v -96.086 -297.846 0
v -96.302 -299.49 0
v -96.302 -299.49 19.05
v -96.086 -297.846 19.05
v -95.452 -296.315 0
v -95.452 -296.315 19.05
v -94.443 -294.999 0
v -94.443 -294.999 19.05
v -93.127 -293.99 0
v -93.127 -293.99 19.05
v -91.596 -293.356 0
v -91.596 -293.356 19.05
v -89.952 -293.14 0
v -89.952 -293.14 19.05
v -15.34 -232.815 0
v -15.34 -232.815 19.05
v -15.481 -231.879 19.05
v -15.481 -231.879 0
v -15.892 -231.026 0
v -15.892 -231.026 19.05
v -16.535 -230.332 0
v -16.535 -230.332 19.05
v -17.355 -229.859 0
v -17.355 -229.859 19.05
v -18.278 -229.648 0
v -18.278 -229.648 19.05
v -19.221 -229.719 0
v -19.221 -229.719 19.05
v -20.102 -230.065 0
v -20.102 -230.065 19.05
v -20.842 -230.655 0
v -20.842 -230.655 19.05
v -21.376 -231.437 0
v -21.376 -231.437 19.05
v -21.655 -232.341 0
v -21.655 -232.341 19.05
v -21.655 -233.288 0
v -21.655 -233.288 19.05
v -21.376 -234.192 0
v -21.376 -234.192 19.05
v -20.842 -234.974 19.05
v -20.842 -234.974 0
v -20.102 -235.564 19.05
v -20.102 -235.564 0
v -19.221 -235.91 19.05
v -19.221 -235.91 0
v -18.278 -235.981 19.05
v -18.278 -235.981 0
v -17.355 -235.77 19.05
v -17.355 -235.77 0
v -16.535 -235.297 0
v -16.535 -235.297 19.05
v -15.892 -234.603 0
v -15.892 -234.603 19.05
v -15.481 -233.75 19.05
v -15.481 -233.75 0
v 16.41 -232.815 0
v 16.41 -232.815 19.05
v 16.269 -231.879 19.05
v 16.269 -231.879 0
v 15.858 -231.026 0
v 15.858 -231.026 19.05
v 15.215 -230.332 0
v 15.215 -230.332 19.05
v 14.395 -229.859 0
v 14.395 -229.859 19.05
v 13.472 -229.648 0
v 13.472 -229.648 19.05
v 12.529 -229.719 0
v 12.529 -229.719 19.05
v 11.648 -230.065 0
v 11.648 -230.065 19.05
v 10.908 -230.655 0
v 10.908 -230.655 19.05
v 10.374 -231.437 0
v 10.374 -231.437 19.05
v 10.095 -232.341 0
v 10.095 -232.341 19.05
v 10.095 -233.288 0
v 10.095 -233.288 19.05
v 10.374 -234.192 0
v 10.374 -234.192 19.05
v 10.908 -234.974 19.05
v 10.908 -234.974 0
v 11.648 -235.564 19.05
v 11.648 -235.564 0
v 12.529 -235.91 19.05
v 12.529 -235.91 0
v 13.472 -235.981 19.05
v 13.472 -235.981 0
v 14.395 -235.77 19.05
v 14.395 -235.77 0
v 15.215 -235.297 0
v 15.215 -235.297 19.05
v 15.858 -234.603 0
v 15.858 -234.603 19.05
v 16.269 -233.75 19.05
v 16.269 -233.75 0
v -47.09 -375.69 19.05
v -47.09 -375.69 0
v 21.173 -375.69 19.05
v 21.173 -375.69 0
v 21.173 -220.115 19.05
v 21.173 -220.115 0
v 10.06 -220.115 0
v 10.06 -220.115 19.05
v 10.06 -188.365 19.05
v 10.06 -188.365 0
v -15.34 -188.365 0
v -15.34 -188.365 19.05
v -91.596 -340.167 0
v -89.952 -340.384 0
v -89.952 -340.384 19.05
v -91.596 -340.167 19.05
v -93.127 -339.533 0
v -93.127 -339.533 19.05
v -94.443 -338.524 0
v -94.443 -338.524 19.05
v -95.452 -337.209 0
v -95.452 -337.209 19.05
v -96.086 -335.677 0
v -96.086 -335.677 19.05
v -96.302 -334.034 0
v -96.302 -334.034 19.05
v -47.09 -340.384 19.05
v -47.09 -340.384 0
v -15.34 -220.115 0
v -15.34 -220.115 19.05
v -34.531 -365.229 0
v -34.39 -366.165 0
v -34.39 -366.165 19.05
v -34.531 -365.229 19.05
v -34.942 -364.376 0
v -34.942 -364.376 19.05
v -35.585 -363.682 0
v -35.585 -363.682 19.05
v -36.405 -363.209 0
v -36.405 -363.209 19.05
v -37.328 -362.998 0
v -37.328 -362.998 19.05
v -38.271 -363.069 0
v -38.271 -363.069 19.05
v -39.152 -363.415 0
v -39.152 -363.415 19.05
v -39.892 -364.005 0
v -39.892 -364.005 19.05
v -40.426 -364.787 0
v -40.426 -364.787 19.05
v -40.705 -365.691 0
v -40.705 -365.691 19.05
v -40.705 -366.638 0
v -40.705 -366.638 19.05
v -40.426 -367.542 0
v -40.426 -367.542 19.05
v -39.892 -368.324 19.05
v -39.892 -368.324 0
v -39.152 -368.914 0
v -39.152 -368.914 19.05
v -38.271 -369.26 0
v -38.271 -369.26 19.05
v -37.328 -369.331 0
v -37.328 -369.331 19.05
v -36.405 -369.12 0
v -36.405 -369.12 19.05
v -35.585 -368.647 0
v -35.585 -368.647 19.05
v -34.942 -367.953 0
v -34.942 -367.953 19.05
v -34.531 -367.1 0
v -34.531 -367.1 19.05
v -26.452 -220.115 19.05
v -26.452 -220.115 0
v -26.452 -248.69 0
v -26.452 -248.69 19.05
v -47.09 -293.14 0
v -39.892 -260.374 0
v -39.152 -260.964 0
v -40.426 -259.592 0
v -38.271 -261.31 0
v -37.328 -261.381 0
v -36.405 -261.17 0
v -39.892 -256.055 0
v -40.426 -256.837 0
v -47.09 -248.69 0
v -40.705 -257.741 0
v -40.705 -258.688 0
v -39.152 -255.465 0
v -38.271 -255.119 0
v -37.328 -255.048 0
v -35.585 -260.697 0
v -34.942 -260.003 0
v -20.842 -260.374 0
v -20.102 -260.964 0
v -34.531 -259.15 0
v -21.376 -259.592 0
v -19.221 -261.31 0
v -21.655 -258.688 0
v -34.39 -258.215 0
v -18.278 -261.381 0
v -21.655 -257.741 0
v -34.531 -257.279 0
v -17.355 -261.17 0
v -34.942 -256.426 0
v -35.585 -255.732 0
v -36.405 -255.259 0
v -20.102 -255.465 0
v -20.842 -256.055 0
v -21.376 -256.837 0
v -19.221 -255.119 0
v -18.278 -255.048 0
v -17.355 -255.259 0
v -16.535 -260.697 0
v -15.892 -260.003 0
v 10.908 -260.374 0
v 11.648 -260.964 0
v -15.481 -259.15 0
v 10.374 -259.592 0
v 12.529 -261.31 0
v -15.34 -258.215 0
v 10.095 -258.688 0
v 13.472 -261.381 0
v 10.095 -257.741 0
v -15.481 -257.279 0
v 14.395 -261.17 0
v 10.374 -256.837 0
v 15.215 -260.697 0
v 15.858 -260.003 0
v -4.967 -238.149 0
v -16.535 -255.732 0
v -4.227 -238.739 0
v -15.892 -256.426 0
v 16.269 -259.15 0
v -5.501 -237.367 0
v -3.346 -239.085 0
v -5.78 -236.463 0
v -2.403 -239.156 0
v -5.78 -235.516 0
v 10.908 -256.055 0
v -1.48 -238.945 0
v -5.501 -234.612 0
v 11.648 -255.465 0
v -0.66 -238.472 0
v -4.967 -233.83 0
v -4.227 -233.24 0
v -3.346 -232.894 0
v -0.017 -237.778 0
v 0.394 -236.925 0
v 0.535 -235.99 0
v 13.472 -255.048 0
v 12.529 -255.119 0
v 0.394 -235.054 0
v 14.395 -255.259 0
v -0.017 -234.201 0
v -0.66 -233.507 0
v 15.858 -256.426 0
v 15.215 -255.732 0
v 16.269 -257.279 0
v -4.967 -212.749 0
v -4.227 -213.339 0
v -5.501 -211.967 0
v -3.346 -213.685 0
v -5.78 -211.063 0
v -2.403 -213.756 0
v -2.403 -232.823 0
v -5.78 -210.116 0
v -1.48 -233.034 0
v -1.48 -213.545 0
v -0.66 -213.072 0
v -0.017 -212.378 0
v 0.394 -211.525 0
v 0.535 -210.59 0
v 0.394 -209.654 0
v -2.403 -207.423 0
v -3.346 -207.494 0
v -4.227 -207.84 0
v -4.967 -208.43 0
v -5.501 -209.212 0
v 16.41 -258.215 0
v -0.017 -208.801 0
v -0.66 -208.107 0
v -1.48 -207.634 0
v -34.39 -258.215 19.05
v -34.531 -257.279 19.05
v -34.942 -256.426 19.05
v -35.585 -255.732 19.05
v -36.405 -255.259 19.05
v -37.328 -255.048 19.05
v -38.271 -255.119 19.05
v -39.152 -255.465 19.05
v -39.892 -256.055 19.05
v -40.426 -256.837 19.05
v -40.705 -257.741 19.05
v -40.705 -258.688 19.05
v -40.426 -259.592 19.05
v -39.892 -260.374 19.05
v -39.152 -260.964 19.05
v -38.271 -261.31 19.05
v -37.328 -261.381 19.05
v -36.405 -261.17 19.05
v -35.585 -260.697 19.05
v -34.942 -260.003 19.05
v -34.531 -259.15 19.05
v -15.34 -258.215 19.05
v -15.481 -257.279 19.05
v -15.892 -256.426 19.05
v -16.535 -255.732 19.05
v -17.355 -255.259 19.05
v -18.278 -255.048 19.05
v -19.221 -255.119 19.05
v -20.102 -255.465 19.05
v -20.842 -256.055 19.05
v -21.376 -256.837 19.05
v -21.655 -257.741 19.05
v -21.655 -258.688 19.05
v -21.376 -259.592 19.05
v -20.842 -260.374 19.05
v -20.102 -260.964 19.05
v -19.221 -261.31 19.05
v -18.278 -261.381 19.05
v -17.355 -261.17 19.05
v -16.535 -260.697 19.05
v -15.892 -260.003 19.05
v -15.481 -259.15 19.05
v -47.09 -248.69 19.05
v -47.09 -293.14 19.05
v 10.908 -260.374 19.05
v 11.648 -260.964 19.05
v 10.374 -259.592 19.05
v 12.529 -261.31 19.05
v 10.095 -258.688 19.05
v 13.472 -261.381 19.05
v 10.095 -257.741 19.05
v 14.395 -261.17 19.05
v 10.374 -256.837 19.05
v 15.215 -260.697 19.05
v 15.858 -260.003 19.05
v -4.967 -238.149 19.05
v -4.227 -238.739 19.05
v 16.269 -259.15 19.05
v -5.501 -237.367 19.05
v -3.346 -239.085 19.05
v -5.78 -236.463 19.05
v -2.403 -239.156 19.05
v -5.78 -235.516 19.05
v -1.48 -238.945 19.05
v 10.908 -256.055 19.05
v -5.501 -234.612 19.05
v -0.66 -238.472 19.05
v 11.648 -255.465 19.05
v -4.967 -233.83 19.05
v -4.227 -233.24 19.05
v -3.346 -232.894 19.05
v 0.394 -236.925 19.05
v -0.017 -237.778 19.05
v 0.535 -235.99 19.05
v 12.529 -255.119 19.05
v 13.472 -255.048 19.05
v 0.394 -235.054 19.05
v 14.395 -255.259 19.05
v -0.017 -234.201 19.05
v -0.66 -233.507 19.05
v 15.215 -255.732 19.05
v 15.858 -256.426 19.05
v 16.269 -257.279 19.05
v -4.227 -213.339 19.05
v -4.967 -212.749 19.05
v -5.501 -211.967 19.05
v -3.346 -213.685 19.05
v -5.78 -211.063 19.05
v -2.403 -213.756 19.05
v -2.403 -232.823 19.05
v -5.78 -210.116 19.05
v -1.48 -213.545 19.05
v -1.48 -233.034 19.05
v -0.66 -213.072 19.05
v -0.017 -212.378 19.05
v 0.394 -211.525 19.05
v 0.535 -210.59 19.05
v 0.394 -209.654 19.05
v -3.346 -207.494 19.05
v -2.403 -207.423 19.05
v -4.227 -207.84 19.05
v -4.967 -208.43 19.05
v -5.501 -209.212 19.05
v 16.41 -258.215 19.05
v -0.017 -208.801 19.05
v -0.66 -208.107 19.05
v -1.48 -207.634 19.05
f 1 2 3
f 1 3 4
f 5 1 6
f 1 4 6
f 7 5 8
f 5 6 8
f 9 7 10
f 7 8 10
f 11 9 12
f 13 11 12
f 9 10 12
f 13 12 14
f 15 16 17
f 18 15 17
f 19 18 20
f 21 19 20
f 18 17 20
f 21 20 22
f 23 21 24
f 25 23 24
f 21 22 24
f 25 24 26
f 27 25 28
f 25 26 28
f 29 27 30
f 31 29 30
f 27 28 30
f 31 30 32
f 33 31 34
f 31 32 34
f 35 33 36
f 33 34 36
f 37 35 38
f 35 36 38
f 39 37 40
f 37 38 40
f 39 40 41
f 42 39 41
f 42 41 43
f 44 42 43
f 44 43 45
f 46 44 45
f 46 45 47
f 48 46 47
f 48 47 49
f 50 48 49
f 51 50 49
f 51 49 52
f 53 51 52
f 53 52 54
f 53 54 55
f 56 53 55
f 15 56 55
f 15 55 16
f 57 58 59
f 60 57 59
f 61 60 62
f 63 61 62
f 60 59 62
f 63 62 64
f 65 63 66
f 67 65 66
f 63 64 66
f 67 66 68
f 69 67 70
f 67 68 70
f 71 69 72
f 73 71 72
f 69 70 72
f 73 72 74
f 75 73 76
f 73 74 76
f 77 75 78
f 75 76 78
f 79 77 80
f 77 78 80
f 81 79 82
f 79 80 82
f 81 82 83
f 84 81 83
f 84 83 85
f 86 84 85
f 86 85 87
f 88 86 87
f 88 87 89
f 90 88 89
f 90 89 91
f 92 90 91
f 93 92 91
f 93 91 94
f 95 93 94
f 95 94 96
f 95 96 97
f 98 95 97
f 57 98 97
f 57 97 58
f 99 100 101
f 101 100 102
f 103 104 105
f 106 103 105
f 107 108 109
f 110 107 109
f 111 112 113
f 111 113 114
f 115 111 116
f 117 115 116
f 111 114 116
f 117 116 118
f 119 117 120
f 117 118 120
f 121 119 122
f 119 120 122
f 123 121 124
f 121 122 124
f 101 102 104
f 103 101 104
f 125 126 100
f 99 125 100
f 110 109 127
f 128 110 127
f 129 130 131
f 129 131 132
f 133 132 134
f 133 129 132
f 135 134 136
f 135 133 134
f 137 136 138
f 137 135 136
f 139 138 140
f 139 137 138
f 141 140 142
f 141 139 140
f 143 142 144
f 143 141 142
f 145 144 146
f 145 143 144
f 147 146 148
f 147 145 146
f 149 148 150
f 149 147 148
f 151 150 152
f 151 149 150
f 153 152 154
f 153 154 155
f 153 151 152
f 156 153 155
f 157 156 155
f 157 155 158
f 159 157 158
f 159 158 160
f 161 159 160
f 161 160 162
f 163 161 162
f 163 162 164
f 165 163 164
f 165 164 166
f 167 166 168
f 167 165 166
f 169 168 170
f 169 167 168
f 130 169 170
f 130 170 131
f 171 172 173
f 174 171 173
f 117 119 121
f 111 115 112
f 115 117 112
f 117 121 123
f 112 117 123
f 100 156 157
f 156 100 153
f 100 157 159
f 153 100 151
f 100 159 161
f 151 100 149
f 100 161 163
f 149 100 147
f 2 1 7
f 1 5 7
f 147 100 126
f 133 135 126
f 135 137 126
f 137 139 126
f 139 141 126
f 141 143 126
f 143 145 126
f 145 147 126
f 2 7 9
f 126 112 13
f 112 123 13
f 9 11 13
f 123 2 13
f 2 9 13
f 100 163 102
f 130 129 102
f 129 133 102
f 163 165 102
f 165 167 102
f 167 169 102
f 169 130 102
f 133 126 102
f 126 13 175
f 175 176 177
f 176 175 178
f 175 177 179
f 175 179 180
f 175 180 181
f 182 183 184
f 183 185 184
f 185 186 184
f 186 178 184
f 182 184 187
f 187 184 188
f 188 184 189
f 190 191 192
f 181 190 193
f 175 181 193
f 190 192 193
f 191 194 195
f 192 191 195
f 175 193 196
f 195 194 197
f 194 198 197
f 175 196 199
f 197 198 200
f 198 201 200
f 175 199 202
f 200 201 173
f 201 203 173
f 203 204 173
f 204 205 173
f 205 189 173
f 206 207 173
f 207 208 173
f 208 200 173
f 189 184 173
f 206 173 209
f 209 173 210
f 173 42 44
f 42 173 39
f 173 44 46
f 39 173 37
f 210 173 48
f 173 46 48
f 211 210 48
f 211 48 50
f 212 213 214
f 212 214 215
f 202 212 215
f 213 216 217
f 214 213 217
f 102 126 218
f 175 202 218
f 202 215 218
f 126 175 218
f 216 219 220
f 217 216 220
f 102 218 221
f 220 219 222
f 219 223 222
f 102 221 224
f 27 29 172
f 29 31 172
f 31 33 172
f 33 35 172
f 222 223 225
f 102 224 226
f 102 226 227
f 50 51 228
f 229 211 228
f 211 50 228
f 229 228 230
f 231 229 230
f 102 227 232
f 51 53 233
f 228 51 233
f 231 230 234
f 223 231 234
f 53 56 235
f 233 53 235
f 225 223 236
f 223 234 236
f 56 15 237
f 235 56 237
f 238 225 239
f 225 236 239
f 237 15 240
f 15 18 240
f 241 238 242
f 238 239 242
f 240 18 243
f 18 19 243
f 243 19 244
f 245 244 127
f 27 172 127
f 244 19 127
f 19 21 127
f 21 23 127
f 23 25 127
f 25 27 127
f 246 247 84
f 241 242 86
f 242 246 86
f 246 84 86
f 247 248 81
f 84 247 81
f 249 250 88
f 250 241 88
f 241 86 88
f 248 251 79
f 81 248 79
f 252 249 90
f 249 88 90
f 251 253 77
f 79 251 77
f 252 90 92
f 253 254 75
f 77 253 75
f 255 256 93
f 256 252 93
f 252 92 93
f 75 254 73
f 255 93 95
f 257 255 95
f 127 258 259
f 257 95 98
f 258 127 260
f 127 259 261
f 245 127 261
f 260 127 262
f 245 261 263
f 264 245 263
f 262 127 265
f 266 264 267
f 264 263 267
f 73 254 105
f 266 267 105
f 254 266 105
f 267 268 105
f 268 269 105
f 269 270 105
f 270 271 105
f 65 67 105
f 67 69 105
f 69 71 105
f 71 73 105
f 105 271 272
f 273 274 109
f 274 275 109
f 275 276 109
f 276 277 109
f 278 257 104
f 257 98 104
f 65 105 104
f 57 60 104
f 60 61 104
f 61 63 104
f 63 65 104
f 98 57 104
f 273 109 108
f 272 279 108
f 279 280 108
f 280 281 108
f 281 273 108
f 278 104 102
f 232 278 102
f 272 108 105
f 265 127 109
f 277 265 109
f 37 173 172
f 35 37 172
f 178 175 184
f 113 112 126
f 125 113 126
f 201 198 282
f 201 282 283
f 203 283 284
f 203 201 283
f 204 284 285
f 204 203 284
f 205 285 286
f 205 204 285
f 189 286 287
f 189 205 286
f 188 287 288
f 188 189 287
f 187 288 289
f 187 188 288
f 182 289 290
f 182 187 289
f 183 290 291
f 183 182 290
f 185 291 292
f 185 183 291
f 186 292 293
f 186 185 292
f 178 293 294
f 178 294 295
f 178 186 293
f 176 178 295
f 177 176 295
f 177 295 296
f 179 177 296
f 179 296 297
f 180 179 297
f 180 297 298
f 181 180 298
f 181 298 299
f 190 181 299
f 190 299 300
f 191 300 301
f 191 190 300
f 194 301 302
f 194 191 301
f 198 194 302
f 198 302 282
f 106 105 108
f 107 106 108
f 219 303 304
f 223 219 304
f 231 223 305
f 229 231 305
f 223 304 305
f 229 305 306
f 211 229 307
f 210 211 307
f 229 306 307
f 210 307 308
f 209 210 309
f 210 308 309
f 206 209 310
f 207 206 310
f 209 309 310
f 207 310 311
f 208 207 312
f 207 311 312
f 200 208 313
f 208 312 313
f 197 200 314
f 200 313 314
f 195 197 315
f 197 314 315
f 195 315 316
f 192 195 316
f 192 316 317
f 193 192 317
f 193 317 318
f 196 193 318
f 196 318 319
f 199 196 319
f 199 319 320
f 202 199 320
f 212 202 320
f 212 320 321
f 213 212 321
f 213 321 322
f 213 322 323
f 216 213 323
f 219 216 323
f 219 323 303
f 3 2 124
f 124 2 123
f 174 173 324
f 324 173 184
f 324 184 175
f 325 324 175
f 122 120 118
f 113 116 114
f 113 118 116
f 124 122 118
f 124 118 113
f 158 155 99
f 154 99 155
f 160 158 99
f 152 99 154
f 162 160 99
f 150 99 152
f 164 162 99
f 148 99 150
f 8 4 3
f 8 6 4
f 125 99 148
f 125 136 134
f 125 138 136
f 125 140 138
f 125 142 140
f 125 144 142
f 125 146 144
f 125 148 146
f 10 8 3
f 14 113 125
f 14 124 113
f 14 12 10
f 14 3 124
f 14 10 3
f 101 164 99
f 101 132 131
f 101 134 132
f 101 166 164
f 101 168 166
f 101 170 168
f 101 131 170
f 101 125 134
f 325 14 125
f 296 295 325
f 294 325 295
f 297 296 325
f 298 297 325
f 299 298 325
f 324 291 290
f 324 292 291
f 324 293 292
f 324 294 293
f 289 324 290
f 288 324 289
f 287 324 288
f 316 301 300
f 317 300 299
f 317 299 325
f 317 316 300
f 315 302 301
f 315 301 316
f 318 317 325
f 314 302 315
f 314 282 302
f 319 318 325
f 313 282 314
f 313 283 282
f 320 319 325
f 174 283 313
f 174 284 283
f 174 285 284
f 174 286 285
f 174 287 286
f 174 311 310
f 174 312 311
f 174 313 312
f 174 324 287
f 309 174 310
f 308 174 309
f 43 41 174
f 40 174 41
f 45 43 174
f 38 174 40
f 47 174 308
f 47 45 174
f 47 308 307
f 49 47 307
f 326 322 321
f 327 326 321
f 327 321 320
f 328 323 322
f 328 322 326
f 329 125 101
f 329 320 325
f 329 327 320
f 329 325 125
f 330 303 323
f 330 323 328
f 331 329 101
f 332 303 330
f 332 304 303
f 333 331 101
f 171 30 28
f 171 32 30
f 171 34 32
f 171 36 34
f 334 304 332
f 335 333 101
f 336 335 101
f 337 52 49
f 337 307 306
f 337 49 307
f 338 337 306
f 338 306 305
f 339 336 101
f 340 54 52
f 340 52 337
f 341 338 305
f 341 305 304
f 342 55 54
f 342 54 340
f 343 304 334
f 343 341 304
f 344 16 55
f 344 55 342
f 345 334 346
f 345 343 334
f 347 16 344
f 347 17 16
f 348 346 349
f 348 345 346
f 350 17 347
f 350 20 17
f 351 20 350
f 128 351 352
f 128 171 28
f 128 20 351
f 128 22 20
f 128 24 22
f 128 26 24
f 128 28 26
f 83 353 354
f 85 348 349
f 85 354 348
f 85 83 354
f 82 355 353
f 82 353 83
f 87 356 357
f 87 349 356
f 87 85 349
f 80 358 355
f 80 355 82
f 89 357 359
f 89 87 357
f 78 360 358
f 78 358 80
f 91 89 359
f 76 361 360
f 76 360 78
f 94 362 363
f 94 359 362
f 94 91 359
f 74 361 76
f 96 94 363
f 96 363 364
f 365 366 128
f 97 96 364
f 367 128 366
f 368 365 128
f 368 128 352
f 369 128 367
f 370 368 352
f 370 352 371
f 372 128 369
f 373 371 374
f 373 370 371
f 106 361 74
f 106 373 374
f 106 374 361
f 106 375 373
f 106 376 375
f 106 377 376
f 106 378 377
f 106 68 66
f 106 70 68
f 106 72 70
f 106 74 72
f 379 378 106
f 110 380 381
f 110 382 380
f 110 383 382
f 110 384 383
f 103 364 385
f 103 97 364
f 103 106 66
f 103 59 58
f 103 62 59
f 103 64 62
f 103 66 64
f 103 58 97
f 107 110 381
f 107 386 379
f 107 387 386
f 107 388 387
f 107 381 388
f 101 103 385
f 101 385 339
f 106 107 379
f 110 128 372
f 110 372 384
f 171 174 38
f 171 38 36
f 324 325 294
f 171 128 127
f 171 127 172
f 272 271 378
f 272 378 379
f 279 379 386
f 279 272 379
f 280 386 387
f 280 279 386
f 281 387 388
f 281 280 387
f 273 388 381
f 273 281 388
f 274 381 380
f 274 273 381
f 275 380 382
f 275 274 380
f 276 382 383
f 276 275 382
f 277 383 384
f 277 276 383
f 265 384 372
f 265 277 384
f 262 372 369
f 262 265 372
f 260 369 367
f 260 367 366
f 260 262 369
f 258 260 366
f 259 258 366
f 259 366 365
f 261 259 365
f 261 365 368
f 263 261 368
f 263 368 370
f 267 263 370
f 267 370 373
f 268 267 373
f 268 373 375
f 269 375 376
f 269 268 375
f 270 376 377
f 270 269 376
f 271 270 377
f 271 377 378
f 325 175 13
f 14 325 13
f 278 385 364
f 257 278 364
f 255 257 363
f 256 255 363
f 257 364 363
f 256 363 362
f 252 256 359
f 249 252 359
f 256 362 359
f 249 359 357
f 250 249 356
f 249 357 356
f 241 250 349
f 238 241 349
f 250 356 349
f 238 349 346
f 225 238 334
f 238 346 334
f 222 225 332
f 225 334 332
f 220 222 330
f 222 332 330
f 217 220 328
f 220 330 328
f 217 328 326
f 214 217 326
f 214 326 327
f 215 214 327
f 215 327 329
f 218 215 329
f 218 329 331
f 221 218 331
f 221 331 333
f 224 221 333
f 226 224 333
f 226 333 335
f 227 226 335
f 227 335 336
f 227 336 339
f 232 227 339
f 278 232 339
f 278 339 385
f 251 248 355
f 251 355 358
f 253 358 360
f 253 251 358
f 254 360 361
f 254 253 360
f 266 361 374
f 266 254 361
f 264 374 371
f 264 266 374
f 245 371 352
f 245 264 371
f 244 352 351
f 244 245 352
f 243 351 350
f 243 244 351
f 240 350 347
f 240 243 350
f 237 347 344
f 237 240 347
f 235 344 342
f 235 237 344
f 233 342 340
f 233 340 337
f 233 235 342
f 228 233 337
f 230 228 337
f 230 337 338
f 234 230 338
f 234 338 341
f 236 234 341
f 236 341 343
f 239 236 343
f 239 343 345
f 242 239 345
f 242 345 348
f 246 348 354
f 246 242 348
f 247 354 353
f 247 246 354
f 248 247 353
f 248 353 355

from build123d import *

# Parameters (mm, degrees)
F0_R     = 3.175
F1_DEPTH = 19.05
F2_R     = 3.175
F3_DEPTH = 25.4
F4_R     = 6.35


with BuildPart() as f1:
    # F0 (on Top) → F1 (new body)
    with BuildSketch(Plane.XY):
        Polygon((21.1725122346, -375.6896027952), (21.1725122346, -220.1146027952), (10.0600122346, -220.1146027952), (10.0600122346, -188.3646027952), (-15.3399877654, -188.3646027952), (-15.3399877654, -210.5896027952), (-15.3399877654, -220.1146027952), (-26.4524877654, -220.1146027952), (-26.4524877654, -248.6896067858), (-47.0899877654, -248.6896067858), (-47.0899877654, -293.1396027952), (-96.3024877654, -293.1396027952), (-96.3024877654, -314.9836027952), (-96.3024877654, -340.3836027952), (-47.0899877654, -340.3836027952), (-47.0899877654, -375.6896027952), (-26.4524877654, -375.6896027952), (-13.7524877654, -375.6896027952), align=None)
        with Locations((-37.5649877654, -366.1646027952)):
            Circle(F0_R, mode=Mode.SUBTRACT)
        with Locations((-37.5649877654, -258.2146027952)):
            Circle(F0_R, mode=Mode.SUBTRACT)
        with Locations((-2.6399877654, -235.9896027952)):
            Circle(F0_R, mode=Mode.SUBTRACT)
        with Locations((-2.6399877654, -210.5896027952)):
            Circle(F0_R, mode=Mode.SUBTRACT)
    extrude(amount=F1_DEPTH)

    # F2 (on face) → F3 (cut)
    with BuildSketch(Plane.XY.offset(19.05)):
        with Locations((-18.5149877654, -232.8146027952)):
            Circle(F2_R)
        with Locations((13.2350122346, -232.8146027952)):
            Circle(F2_R)
        with Locations((13.2350122346, -258.2146027952)):
            Circle(F2_R)
        with Locations((-18.5149877654, -258.2146027952)):
            Circle(F2_R)
    extrude(amount=-F3_DEPTH, mode=Mode.SUBTRACT)

    # F4
    f4_edges = [f1.edges().sort_by_distance(p)[0] for p in [
        (-96.302488, -340.383603, 9.525),
        (-96.302488, -293.139603, 9.525),
    ]]
    fillet(f4_edges, radius=F4_R)


solid = f1.part
